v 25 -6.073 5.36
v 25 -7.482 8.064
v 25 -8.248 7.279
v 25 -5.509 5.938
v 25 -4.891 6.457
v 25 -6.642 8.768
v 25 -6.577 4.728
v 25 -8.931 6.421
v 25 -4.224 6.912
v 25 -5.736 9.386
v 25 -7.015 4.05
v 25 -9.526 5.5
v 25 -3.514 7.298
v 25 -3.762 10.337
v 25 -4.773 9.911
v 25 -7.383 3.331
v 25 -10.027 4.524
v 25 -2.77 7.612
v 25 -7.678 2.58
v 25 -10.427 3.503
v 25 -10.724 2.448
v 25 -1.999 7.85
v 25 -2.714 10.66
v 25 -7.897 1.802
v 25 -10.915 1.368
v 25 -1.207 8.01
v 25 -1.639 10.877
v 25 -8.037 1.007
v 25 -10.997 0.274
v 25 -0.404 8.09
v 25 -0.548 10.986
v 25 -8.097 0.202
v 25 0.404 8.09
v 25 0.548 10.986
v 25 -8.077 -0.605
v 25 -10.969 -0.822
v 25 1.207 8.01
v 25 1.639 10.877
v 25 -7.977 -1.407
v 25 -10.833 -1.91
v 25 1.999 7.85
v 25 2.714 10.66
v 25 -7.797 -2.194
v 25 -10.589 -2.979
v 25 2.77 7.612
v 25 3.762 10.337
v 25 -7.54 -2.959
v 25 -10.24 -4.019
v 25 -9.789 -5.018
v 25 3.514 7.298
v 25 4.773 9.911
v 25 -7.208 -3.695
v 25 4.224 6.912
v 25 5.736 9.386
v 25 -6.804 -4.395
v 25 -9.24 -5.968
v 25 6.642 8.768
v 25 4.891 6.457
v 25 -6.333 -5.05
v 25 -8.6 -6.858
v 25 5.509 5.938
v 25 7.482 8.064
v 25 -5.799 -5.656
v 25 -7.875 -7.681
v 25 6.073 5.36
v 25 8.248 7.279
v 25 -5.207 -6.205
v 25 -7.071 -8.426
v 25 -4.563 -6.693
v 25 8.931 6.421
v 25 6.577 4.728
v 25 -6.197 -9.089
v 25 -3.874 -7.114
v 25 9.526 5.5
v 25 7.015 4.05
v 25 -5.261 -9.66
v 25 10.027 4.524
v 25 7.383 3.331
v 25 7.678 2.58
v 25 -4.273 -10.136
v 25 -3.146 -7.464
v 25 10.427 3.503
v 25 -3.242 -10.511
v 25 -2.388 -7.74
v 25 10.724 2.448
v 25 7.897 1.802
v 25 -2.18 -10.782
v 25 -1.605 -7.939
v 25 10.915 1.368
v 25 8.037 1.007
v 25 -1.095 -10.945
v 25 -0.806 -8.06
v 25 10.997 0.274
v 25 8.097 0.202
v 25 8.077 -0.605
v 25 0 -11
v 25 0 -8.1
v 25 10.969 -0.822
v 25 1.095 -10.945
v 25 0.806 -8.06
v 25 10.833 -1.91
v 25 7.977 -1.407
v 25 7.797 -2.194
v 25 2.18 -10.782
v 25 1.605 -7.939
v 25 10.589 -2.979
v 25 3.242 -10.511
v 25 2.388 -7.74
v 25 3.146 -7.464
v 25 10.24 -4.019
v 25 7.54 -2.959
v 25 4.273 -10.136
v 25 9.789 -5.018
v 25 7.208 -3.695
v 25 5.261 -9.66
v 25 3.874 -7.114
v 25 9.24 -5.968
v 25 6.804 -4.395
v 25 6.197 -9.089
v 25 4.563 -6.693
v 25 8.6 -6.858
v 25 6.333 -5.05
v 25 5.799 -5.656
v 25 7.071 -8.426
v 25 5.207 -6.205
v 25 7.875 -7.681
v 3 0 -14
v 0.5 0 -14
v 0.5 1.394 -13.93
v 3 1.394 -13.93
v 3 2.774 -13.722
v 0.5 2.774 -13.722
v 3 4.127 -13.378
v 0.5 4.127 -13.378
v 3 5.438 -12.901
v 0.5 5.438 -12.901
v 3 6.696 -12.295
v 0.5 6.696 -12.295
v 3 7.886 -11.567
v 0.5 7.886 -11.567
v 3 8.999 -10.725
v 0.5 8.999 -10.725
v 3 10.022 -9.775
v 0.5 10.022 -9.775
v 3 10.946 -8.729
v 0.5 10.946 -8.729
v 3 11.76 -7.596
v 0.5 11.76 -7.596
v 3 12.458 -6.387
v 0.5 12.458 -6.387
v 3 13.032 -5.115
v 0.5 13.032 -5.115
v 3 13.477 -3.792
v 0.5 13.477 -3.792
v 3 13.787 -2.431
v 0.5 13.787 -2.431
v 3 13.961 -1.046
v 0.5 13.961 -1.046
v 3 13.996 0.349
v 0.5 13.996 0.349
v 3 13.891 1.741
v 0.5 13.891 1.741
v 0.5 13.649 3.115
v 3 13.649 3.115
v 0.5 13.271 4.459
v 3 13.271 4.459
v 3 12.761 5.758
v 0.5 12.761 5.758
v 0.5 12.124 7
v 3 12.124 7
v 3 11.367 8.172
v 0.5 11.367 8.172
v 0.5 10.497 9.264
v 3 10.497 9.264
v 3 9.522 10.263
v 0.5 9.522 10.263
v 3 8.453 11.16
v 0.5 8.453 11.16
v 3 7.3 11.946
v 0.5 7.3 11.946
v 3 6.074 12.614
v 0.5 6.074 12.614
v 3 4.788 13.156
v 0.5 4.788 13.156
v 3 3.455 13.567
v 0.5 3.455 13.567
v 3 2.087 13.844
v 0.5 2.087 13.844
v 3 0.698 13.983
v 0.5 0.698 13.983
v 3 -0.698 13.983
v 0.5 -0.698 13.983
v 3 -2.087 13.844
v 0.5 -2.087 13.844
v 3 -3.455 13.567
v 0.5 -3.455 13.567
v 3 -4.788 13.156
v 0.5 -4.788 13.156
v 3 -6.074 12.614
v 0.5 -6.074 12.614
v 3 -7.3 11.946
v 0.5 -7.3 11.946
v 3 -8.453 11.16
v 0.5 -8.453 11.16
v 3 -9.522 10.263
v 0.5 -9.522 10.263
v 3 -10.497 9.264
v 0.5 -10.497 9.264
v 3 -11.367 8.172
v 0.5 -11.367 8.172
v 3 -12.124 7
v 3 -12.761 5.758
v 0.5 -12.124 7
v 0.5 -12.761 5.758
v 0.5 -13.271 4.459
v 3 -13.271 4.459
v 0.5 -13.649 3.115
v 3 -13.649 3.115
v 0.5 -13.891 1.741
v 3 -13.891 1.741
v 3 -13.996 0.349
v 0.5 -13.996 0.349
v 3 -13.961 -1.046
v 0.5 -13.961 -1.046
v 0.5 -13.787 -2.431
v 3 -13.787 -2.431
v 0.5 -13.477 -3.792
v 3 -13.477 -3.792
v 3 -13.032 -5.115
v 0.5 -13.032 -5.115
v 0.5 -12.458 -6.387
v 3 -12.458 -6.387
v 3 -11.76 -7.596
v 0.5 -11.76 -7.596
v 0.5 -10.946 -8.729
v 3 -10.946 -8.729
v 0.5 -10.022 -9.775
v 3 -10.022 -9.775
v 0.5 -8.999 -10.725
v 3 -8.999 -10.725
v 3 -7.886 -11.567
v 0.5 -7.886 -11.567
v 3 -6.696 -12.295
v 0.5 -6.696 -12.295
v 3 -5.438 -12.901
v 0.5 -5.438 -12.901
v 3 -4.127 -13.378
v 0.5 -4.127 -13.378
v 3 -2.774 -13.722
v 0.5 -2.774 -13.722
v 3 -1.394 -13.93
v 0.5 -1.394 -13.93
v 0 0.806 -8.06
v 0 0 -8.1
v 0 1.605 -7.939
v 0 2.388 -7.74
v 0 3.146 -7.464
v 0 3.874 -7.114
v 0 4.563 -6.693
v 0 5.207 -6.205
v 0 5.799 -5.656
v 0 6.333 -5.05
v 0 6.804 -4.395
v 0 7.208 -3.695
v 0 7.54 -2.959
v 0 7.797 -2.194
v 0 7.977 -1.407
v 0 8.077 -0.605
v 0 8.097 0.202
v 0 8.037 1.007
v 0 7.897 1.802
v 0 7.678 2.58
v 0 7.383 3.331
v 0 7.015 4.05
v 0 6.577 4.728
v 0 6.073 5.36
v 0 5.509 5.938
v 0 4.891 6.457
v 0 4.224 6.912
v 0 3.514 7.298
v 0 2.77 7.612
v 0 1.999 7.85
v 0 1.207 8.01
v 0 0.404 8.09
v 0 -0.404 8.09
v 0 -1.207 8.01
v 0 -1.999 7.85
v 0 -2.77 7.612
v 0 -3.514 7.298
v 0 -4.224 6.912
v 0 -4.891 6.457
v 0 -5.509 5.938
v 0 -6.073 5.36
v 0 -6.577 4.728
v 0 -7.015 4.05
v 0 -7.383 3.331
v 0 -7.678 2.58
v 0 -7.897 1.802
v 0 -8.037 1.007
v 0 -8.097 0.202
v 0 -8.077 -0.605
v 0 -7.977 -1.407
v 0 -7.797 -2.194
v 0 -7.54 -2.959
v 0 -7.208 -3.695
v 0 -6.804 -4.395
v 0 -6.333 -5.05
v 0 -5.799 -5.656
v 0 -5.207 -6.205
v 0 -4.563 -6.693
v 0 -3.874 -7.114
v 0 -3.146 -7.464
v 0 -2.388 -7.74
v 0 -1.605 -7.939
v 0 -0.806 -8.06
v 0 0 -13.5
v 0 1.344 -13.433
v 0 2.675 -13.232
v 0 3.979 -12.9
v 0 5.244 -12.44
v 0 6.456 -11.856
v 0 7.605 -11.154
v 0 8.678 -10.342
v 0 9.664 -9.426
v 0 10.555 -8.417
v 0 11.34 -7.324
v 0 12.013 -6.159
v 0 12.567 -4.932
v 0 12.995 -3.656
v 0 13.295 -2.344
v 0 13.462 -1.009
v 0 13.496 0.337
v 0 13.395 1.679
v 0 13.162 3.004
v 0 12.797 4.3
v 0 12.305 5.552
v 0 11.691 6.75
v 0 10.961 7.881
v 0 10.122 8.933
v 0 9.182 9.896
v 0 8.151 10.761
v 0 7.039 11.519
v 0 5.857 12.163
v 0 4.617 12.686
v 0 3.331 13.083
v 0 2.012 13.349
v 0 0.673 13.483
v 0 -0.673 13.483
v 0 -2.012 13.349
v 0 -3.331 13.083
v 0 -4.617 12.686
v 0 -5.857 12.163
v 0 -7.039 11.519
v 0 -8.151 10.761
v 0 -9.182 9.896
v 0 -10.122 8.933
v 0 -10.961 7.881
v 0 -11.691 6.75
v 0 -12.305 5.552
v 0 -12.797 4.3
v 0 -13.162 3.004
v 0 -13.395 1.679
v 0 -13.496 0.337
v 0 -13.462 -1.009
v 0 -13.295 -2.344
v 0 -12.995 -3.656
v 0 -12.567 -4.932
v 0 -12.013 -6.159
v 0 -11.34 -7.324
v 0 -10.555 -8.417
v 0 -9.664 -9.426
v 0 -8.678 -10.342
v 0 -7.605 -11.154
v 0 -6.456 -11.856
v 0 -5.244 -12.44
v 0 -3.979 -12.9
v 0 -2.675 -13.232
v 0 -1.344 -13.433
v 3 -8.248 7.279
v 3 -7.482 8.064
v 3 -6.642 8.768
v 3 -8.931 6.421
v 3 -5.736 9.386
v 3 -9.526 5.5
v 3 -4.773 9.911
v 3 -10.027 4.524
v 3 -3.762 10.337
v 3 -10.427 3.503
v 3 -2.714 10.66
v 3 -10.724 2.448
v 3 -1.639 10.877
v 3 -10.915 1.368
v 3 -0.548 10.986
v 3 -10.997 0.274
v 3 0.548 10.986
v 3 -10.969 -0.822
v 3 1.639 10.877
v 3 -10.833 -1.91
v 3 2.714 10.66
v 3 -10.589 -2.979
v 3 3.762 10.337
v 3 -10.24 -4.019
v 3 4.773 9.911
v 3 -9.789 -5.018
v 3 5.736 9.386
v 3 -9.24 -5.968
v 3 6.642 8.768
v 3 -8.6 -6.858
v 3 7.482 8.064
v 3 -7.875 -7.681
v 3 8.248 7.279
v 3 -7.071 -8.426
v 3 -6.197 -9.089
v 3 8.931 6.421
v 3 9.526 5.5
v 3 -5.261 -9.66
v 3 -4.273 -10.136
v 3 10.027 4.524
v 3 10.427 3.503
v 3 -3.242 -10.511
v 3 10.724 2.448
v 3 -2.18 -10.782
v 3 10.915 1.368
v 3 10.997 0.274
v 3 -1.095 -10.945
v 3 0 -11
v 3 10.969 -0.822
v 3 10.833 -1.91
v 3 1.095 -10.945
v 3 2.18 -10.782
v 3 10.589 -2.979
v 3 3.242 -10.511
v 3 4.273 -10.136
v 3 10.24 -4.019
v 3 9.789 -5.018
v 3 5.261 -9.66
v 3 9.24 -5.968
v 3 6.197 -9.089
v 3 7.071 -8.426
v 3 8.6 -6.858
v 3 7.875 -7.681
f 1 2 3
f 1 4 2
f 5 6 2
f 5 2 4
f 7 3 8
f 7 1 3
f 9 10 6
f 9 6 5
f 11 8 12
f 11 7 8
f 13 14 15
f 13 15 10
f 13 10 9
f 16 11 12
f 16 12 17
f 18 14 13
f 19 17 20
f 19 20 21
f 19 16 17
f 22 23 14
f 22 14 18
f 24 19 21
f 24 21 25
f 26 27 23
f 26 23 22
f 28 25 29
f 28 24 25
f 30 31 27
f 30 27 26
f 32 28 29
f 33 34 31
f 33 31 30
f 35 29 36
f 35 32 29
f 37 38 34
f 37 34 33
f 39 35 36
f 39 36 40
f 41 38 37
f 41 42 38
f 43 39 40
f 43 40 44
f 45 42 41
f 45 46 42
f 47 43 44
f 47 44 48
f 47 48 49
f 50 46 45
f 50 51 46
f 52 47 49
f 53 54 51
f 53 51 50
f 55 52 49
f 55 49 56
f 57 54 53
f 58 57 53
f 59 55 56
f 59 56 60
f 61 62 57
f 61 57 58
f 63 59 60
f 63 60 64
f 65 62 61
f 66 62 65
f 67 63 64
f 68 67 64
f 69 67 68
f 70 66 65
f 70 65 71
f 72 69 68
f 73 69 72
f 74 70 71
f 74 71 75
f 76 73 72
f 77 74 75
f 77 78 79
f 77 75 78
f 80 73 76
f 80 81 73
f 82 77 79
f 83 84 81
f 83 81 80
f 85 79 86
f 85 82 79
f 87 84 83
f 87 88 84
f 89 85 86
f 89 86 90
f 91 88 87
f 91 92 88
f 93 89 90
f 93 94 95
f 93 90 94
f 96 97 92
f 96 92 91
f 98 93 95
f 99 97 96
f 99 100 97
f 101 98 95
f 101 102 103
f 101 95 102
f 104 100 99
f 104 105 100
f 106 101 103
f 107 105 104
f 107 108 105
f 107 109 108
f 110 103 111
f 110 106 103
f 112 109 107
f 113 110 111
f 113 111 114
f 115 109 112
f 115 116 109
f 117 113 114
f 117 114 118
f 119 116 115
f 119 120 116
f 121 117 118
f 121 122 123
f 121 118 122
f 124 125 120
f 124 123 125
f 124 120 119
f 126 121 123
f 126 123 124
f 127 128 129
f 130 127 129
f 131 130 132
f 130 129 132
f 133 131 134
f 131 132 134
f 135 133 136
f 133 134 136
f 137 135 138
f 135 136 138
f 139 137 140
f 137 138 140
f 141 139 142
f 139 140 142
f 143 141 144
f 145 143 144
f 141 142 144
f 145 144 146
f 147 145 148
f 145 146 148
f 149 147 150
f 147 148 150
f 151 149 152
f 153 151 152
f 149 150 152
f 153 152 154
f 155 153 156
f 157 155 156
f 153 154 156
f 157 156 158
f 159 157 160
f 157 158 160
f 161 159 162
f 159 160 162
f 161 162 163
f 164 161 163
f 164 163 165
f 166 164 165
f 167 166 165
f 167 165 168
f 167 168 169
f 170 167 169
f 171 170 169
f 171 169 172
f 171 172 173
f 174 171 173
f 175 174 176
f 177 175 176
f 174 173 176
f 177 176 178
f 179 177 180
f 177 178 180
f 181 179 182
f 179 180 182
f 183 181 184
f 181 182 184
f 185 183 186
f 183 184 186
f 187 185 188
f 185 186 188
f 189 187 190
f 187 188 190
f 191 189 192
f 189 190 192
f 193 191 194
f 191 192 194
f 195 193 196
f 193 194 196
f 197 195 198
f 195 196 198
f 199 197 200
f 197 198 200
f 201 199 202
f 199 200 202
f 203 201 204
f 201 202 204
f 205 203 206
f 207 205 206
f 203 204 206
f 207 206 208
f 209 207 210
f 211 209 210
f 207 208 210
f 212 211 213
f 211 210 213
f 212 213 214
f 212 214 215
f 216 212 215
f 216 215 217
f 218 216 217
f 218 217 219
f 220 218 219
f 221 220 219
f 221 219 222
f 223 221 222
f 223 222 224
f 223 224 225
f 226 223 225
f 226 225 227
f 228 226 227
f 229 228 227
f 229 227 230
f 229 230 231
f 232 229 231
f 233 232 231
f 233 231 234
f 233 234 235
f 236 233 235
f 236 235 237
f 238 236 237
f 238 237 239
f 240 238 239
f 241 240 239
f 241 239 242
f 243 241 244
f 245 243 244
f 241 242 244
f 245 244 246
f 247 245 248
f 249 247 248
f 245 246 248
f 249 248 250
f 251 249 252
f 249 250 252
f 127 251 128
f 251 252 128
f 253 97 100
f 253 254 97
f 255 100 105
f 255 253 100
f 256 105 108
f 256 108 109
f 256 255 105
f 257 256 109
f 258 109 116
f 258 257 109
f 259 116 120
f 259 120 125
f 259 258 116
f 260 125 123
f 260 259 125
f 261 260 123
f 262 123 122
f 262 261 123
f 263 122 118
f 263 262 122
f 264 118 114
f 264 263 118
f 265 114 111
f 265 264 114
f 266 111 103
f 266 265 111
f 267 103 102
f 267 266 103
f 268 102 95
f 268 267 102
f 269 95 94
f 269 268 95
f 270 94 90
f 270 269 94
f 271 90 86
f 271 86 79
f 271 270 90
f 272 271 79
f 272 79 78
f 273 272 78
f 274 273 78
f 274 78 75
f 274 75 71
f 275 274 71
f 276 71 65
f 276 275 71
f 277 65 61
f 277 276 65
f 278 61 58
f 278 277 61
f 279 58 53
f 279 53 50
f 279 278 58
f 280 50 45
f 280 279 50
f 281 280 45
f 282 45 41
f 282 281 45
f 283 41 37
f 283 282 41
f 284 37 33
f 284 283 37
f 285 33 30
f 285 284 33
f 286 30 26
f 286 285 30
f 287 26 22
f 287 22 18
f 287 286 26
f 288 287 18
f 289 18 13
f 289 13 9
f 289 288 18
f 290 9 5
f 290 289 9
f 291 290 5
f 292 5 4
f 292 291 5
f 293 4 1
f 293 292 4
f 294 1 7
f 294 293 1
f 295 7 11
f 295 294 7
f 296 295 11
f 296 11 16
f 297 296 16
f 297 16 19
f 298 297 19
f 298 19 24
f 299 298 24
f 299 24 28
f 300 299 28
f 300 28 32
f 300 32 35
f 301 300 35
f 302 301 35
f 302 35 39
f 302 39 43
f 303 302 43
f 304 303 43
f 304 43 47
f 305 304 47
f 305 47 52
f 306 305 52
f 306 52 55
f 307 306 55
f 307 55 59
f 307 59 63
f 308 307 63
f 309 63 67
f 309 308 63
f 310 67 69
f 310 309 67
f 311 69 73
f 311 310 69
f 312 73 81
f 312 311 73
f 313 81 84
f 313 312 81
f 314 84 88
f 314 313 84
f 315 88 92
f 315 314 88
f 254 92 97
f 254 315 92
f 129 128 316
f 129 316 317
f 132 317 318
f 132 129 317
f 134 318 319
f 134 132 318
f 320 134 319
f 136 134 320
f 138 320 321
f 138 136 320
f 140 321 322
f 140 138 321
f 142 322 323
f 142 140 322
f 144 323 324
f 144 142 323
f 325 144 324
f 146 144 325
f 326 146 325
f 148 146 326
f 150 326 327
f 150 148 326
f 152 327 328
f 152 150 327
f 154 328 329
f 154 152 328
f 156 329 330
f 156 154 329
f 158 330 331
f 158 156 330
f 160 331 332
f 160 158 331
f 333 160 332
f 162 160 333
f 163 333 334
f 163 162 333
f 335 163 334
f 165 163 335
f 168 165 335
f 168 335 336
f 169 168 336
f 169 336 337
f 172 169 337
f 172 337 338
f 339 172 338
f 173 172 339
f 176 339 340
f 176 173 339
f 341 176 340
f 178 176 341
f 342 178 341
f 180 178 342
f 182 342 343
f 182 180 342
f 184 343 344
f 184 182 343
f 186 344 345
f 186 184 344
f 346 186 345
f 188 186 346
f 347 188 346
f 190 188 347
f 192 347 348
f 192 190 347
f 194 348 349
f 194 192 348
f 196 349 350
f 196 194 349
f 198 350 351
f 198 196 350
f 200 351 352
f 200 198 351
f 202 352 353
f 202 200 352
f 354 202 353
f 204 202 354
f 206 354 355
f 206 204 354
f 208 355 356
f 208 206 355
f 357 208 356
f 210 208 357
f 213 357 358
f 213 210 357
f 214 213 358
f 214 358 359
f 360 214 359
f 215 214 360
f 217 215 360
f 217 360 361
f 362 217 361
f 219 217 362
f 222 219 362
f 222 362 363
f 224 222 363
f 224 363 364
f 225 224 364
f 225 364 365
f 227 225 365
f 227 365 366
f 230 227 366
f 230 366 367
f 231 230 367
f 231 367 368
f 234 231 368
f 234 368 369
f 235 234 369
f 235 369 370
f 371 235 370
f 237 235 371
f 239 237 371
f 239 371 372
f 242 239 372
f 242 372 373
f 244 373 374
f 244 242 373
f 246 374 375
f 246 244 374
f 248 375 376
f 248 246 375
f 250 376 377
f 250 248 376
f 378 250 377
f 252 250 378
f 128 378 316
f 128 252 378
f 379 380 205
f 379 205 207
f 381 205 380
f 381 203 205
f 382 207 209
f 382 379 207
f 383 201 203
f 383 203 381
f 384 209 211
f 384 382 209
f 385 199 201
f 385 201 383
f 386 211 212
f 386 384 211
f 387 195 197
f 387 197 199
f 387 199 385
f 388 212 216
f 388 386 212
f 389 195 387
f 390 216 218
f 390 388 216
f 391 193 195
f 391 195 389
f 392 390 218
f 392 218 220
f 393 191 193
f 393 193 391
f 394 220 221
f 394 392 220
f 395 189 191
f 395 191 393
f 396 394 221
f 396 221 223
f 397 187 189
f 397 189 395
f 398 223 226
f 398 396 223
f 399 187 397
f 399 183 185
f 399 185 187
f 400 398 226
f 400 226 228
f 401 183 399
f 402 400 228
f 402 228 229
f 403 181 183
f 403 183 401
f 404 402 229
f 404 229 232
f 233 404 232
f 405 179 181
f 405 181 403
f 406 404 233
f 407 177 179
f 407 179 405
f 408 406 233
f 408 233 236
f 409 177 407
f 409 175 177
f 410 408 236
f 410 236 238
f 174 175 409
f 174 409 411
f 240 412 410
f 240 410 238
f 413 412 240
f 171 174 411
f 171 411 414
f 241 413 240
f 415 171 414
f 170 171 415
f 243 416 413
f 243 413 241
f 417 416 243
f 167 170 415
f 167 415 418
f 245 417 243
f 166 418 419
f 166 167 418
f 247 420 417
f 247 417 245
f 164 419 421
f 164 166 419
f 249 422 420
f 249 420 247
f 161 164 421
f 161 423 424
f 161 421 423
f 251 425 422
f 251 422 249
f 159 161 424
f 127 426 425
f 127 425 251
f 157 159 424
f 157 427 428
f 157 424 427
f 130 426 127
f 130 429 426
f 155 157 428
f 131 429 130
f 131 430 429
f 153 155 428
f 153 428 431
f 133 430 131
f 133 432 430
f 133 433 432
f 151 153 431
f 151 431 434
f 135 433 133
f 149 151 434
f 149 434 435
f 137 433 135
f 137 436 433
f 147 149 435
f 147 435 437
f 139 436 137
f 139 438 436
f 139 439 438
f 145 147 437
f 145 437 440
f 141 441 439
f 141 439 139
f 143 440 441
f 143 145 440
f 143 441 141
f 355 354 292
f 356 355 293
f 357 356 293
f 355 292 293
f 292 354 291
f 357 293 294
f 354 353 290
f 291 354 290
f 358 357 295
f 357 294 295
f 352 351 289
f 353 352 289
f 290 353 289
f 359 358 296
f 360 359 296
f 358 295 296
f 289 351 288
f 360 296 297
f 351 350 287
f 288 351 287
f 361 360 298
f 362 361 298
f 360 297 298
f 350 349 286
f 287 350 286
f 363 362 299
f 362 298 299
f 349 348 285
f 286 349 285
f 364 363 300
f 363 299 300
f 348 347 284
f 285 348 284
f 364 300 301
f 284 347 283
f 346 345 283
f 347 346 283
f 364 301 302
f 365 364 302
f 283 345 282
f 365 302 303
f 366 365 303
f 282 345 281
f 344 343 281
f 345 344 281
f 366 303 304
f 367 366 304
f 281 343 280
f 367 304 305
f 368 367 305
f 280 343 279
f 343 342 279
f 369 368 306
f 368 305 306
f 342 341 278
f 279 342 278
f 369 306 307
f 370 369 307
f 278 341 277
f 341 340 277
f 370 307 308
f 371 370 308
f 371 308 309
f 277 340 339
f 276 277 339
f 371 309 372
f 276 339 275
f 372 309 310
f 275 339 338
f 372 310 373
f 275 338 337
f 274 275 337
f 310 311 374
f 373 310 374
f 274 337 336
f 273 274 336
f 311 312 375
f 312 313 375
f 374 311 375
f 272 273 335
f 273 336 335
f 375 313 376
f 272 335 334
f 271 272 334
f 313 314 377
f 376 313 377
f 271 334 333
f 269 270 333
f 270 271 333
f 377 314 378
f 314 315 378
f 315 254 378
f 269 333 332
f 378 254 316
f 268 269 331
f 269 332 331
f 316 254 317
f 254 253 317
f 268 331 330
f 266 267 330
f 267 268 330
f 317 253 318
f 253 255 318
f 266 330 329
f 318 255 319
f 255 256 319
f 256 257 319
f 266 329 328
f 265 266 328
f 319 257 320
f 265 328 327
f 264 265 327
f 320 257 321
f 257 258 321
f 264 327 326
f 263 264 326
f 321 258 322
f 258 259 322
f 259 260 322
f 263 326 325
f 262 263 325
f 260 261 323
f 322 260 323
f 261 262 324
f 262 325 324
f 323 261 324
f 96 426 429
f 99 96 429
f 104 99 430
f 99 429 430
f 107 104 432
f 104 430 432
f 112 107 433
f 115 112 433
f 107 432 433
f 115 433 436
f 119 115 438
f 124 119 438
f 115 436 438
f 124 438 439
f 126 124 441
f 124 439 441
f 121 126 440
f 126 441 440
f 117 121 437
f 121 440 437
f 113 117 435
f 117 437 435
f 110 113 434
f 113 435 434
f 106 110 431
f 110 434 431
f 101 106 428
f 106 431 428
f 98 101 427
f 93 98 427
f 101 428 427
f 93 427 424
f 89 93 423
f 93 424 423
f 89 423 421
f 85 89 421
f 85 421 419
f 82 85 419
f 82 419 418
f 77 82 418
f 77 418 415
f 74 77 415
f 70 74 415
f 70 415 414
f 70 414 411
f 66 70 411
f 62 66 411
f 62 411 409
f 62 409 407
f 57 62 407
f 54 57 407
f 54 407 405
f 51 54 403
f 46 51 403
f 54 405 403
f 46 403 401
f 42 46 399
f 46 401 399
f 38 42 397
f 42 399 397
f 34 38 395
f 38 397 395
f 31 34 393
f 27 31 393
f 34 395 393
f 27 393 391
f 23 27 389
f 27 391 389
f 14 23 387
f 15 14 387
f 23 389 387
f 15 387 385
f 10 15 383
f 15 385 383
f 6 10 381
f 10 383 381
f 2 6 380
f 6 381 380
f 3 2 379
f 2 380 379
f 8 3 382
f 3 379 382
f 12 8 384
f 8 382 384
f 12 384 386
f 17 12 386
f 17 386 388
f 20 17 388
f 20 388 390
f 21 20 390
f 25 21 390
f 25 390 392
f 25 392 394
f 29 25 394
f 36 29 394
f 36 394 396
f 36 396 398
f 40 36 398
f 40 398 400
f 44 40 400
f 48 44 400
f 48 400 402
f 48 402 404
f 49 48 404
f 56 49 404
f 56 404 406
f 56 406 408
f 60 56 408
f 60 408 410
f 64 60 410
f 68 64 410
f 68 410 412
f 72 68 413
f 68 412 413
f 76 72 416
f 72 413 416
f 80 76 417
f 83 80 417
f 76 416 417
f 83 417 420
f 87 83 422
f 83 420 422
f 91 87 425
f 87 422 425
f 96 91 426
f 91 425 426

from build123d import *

# Parameters (mm, degrees)
SZKIC1_R                    = 14
SZKIC1_R_2                  = 8.1
DODANIE_WYCI_GNI_CIE1_DEPTH = 3
SZKIC2_R                    = 11
SZKIC2_R_2                  = 8.1
DODANIE_WYCI_GNI_CIE2_DEPTH = 22
SFAZOWANIE1_SIZE            = 0.5


with BuildPart() as part:
    # Szkic1 → Dodanie-wyciągnięcie1 (new body)
    with BuildSketch(Plane(origin=(0, 0, 0), x_dir=(0, 0, -1), z_dir=(1, 0, 0))):
        Circle(SZKIC1_R)
        Circle(SZKIC1_R_2, mode=Mode.SUBTRACT)
    extrude(amount=DODANIE_WYCI_GNI_CIE1_DEPTH)

    # Szkic2 → Dodanie-wyciągnięcie2 (add)
    with BuildSketch(Plane(origin=(3, 0, 0), x_dir=(0, 0, -1), z_dir=(1, 0, 0))):
        Circle(SZKIC2_R)
        Circle(SZKIC2_R_2, mode=Mode.SUBTRACT)
    extrude(amount=DODANIE_WYCI_GNI_CIE2_DEPTH)

    # Sfazowanie1
    sfazowanie1_edges = [part.edges().sort_by_distance(p)[0] for p in [
        (0, 0, 14),
    ]]
    chamfer(sfazowanie1_edges, length=SFAZOWANIE1_SIZE)


solid = part.part
